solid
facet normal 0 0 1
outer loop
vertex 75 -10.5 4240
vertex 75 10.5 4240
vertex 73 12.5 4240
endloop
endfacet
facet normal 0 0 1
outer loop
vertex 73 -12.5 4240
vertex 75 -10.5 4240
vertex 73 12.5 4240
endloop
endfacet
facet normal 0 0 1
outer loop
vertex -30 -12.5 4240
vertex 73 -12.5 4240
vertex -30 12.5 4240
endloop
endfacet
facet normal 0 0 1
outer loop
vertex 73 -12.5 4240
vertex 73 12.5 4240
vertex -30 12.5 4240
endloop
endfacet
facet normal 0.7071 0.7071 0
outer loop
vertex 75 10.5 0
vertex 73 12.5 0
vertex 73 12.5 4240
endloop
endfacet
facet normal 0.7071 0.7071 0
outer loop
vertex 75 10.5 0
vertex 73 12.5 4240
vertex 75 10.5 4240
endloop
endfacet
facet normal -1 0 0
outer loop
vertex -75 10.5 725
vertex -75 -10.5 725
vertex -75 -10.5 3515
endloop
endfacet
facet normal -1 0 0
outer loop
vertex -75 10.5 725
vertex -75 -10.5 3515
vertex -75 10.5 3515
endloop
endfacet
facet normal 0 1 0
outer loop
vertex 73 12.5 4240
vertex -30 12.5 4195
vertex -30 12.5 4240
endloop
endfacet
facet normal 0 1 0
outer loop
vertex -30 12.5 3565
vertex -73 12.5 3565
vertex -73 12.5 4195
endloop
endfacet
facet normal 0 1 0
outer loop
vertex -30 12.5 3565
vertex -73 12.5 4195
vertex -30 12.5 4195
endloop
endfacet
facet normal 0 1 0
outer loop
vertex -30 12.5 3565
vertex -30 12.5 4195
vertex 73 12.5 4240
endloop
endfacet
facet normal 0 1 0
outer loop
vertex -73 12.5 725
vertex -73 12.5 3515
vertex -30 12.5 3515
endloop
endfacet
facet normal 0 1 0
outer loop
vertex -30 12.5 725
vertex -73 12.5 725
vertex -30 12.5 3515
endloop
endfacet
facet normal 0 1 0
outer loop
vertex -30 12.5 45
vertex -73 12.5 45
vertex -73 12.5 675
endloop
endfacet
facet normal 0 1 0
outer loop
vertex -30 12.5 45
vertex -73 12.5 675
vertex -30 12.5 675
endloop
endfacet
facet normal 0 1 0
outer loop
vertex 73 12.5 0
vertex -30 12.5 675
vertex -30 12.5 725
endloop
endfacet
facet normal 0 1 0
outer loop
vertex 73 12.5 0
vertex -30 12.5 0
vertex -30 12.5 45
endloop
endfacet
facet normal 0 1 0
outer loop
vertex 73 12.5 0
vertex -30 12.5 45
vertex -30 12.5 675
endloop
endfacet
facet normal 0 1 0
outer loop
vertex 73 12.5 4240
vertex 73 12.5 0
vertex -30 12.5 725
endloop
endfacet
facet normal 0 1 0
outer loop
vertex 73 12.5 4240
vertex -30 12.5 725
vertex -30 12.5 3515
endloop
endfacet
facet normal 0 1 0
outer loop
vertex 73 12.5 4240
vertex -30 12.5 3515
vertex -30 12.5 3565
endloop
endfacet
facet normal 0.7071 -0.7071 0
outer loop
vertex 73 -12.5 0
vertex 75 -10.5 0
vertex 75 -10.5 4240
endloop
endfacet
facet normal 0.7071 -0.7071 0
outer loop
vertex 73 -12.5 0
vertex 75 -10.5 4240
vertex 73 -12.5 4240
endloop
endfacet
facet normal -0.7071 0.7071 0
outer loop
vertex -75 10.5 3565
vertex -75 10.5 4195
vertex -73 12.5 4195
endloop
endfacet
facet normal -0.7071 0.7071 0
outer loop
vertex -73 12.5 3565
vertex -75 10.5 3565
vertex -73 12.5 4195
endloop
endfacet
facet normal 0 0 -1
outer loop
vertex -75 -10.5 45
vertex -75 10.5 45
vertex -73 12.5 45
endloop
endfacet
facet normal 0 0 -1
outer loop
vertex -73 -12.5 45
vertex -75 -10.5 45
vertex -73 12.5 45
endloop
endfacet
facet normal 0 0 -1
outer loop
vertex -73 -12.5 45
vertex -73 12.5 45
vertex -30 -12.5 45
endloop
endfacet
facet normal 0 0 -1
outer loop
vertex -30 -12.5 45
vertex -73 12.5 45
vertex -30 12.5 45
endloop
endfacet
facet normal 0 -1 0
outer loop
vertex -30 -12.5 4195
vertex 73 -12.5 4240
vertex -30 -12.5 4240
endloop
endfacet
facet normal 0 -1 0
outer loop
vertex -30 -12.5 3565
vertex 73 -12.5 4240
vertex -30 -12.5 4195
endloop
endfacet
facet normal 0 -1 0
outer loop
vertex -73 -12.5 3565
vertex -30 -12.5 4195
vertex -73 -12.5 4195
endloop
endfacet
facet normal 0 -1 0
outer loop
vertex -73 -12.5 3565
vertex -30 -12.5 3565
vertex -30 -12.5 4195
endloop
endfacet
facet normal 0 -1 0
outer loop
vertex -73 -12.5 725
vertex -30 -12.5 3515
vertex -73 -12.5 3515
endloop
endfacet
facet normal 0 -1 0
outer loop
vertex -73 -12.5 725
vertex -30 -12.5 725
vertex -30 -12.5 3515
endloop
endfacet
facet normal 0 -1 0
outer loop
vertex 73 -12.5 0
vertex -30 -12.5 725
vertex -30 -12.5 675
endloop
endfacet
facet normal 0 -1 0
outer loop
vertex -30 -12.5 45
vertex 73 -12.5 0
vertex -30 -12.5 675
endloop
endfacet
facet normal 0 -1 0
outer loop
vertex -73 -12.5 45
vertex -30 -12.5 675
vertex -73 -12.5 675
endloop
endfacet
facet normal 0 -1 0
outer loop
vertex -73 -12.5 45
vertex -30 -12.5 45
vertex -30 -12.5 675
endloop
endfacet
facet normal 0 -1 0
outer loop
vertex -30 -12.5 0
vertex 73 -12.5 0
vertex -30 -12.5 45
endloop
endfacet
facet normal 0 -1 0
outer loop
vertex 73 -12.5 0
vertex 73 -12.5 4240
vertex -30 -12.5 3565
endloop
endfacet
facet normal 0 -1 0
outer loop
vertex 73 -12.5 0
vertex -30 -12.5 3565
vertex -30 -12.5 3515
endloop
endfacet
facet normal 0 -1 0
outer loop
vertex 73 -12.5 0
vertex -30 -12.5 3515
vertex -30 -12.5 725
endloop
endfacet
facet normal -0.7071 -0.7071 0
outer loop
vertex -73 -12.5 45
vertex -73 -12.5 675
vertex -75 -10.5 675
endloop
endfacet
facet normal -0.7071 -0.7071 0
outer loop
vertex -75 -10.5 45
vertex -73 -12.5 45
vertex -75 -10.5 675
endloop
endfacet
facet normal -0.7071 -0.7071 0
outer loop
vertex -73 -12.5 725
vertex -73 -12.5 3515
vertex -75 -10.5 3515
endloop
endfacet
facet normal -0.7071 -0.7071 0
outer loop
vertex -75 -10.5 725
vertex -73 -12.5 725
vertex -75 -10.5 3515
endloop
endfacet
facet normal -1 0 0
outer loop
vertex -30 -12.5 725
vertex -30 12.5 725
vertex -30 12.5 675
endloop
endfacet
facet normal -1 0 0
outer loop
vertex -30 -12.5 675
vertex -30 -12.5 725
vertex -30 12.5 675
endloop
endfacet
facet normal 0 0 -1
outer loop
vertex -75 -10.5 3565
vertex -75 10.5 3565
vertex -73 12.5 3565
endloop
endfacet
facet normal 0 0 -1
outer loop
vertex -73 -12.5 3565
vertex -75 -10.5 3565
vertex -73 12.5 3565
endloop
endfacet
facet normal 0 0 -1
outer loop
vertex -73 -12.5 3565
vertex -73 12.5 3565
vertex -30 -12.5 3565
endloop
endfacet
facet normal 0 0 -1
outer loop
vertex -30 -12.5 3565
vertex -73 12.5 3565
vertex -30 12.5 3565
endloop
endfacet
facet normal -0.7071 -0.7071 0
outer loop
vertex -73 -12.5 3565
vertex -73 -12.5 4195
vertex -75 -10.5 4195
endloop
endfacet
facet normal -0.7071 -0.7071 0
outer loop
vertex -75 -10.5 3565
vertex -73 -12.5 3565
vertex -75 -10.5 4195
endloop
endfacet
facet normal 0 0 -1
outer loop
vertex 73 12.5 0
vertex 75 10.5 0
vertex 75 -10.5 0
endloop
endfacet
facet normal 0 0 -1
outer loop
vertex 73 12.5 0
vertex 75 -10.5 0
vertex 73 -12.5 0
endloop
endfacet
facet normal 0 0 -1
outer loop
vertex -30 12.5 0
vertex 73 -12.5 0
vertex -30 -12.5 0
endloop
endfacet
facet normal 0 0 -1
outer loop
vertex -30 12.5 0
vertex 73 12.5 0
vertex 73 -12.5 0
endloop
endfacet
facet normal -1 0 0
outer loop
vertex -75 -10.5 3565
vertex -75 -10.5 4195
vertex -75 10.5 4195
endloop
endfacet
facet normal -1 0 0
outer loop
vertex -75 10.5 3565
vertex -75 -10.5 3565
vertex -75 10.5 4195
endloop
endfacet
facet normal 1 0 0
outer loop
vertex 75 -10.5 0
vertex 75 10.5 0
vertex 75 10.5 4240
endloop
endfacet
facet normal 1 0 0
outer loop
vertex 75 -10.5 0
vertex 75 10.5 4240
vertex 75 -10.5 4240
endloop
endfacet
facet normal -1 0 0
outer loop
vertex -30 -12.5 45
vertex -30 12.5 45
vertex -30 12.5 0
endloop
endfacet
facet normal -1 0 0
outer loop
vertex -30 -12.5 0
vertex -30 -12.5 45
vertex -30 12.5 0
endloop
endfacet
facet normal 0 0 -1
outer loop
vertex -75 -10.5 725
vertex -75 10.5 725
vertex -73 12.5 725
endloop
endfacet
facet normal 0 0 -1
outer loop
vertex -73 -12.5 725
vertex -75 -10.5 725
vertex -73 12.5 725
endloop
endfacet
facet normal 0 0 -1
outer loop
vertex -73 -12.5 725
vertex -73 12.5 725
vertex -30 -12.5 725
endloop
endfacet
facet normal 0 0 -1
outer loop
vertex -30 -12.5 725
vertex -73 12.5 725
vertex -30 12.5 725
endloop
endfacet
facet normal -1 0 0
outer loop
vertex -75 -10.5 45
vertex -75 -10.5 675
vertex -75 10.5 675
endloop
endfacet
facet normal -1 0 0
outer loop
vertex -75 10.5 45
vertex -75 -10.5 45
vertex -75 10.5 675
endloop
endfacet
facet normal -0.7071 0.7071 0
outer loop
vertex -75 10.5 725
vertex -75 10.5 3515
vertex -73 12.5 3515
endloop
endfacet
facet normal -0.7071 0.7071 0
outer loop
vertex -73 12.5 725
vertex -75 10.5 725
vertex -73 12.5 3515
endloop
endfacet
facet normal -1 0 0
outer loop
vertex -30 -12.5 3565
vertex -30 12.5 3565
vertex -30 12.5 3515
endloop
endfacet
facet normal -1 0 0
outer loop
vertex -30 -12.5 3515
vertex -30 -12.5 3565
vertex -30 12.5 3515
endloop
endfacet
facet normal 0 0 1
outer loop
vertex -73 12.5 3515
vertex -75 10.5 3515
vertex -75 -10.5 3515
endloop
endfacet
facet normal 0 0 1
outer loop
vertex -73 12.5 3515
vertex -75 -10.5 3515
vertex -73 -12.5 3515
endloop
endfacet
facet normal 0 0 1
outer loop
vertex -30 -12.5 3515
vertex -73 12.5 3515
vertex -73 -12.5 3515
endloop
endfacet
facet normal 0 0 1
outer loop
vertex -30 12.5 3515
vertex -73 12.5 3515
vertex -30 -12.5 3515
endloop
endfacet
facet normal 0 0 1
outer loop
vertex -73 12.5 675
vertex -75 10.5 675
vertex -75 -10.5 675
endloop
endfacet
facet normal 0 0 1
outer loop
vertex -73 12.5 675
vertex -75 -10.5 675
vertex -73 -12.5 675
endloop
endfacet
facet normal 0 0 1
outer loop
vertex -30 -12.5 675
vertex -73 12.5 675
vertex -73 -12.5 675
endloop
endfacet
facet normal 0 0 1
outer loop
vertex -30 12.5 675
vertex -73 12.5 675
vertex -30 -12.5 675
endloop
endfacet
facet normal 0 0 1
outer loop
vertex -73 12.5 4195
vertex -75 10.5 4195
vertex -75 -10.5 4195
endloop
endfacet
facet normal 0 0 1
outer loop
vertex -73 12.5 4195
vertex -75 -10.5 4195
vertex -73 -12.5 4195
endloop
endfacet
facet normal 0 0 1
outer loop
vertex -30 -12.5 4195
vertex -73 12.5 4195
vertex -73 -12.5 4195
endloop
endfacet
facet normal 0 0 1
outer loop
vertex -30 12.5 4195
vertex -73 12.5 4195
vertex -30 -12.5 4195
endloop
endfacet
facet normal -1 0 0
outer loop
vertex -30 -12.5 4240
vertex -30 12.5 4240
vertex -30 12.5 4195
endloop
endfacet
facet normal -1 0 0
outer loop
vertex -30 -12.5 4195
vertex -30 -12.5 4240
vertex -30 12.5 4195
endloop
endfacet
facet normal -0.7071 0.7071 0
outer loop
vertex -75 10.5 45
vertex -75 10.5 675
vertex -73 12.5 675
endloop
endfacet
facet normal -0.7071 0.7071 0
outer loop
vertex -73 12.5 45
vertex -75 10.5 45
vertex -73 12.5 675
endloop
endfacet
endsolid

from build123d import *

# Parameters (mm, degrees)
EXTRUDE_1_DEPTH     = 4240
SKETCH_2_W          = 45
SKETCH_2_H          = 45
SKETCH_2_H_2        = 50
CUT_EXTRUDE_4_DEPTH = 4241.736964255


with BuildPart() as part:
    # Эскиз1 → Бобышка-Вытянуть1 (new body)
    with BuildSketch(Plane.XY):
        Polygon((-75, 10.5), (-73, 12.5), (73, 12.5), (75, 10.5), (75, -10.5), (73, -12.5), (-73, -12.5), (-75, -10.5), align=None)
    extrude(amount=EXTRUDE_1_DEPTH)

    # Эскиз2 → Вырез-Вытянуть4 (cut, through all)
    with BuildSketch(Plane(origin=(0, 12.5, 0), x_dir=(1, 0, 0), z_dir=(0, 1, 0))):
        with Locations((-52.5, -22.5)):
            Rectangle(SKETCH_2_W, SKETCH_2_H)
        with Locations((-52.5, -4217.5)):
            Rectangle(SKETCH_2_W, SKETCH_2_H)
        with Locations((-52.5, -700)):
            Rectangle(SKETCH_2_W, SKETCH_2_H_2)
        with Locations((-52.5, -3540)):
            Rectangle(SKETCH_2_W, SKETCH_2_H_2)
    extrude(amount=-CUT_EXTRUDE_4_DEPTH, mode=Mode.SUBTRACT)


solid = part.part
